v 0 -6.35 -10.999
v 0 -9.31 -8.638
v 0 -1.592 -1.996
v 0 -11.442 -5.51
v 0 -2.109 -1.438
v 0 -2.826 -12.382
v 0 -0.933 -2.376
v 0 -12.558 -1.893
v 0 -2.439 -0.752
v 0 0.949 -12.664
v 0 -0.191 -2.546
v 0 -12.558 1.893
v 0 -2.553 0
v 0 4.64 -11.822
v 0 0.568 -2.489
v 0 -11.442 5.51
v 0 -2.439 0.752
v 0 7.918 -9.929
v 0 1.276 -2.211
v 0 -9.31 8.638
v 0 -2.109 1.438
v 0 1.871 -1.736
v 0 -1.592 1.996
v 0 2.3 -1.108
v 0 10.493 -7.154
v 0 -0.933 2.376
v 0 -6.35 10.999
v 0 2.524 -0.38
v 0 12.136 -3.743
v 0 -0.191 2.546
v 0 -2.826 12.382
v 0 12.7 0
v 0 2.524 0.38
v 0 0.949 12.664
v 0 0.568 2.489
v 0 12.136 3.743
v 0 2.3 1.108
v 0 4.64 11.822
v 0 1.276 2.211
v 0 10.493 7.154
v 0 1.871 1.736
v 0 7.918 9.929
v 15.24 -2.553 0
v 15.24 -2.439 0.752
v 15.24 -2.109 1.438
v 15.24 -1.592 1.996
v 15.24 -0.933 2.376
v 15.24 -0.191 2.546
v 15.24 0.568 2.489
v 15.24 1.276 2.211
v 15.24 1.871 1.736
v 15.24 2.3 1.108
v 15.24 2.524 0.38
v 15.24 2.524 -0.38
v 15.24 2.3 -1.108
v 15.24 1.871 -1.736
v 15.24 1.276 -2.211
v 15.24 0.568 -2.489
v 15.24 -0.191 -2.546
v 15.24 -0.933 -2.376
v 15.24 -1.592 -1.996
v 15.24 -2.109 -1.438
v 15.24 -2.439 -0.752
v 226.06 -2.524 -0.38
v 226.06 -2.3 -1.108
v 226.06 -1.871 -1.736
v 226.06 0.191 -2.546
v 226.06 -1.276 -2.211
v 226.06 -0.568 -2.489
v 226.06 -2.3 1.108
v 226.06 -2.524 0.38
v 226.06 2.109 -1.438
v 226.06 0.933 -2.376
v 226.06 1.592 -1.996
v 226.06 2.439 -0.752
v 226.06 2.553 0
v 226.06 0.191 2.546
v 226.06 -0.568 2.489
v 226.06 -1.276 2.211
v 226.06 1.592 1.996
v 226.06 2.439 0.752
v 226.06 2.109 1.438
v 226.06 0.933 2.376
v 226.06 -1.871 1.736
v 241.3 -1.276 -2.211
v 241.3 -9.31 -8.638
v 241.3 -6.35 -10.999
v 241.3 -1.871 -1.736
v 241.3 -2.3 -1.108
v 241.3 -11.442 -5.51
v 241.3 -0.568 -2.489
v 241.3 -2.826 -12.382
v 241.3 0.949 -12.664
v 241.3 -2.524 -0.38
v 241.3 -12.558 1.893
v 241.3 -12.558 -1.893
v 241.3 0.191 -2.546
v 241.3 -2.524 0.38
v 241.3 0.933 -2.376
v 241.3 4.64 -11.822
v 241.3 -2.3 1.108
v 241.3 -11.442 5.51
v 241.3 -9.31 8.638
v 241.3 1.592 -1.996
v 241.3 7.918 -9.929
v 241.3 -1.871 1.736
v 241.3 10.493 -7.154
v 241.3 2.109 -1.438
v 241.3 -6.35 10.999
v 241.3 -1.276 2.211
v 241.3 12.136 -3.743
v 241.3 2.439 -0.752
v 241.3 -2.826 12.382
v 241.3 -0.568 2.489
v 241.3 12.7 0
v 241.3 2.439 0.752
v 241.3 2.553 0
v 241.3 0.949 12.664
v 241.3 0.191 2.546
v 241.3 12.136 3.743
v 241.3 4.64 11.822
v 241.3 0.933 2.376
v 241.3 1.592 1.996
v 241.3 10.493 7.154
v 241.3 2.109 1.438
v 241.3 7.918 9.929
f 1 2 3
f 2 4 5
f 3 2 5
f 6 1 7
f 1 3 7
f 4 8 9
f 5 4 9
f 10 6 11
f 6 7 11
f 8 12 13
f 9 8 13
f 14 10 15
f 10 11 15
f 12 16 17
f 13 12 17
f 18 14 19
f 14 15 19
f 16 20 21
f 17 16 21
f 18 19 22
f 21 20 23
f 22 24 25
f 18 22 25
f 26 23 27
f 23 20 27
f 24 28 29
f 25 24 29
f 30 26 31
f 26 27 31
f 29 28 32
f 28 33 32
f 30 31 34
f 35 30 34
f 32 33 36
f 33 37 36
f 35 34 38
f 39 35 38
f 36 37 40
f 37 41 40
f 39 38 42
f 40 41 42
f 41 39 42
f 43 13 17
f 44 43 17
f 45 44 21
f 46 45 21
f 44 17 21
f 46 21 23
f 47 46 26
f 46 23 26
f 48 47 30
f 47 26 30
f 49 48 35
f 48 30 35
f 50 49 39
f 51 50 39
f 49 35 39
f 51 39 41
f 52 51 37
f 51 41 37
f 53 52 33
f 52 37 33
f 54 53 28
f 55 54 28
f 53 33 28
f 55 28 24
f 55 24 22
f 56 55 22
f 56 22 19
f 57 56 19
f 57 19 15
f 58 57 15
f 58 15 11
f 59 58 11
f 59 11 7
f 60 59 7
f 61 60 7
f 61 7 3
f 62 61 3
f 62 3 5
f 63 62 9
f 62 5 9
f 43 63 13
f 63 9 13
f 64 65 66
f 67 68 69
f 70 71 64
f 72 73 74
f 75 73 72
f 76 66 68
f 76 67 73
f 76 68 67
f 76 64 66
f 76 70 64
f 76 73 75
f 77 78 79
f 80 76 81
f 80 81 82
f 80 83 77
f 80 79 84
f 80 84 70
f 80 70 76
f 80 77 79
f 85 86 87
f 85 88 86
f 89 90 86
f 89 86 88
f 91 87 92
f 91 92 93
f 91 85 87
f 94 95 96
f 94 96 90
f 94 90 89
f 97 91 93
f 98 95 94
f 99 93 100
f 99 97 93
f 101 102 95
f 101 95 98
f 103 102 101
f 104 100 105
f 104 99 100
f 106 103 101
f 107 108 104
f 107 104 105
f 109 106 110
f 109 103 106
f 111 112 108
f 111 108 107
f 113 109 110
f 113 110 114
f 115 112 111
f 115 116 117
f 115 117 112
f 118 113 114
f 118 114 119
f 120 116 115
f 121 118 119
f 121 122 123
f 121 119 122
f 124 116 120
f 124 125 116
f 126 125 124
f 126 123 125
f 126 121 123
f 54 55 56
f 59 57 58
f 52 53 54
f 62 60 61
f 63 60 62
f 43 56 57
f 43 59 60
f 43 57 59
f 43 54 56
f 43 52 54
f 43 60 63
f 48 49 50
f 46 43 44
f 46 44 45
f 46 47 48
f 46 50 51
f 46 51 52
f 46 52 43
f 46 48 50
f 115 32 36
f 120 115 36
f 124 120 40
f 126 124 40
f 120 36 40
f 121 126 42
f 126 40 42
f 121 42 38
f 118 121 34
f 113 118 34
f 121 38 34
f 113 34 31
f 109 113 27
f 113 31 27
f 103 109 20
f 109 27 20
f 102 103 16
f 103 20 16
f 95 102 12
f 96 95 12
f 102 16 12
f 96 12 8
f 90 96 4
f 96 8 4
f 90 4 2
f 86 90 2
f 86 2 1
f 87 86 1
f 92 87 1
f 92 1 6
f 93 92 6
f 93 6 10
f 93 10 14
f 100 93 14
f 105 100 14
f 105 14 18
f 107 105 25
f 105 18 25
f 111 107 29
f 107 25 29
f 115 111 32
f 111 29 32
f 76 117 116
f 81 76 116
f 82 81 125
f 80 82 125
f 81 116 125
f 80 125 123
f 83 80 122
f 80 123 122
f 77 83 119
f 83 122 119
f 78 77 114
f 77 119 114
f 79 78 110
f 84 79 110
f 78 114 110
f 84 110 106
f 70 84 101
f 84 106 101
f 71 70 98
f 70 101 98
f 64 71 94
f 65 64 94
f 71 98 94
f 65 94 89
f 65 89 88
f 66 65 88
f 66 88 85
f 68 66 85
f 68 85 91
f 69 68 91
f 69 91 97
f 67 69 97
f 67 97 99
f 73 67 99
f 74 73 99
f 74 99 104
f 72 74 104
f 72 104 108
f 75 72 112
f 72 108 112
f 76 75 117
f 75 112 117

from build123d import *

# Parameters (mm, degrees)
F0_R     = 12.7
F1_DEPTH = 241.3
F2_R     = 2.5527
F3_DEPTH = 15.24
F4_R     = 2.5527
F5_DEPTH = 15.24


with BuildPart() as f1:
    # F0 (on Right) → F1 (new body)
    with BuildSketch(Plane.YZ):
        Circle(F0_R)
    extrude(amount=F1_DEPTH)

    # F2 (on face) + F0 (on Right) → F3 (cut)
    with BuildSketch(Plane(origin=(0, 0, 0), x_dir=(0, -1, 0), z_dir=(-1, 0, 0))):
        Circle(F2_R)
    with BuildSketch(Plane.YZ):
        Circle(F0_R)
    extrude(amount=-F3_DEPTH, mode=Mode.SUBTRACT)

    # F4 (on face) → F5 (cut)
    with BuildSketch(Plane.YZ.offset(241.3)):
        Circle(F4_R)
    extrude(amount=-F5_DEPTH, mode=Mode.SUBTRACT)


solid = f1.part
